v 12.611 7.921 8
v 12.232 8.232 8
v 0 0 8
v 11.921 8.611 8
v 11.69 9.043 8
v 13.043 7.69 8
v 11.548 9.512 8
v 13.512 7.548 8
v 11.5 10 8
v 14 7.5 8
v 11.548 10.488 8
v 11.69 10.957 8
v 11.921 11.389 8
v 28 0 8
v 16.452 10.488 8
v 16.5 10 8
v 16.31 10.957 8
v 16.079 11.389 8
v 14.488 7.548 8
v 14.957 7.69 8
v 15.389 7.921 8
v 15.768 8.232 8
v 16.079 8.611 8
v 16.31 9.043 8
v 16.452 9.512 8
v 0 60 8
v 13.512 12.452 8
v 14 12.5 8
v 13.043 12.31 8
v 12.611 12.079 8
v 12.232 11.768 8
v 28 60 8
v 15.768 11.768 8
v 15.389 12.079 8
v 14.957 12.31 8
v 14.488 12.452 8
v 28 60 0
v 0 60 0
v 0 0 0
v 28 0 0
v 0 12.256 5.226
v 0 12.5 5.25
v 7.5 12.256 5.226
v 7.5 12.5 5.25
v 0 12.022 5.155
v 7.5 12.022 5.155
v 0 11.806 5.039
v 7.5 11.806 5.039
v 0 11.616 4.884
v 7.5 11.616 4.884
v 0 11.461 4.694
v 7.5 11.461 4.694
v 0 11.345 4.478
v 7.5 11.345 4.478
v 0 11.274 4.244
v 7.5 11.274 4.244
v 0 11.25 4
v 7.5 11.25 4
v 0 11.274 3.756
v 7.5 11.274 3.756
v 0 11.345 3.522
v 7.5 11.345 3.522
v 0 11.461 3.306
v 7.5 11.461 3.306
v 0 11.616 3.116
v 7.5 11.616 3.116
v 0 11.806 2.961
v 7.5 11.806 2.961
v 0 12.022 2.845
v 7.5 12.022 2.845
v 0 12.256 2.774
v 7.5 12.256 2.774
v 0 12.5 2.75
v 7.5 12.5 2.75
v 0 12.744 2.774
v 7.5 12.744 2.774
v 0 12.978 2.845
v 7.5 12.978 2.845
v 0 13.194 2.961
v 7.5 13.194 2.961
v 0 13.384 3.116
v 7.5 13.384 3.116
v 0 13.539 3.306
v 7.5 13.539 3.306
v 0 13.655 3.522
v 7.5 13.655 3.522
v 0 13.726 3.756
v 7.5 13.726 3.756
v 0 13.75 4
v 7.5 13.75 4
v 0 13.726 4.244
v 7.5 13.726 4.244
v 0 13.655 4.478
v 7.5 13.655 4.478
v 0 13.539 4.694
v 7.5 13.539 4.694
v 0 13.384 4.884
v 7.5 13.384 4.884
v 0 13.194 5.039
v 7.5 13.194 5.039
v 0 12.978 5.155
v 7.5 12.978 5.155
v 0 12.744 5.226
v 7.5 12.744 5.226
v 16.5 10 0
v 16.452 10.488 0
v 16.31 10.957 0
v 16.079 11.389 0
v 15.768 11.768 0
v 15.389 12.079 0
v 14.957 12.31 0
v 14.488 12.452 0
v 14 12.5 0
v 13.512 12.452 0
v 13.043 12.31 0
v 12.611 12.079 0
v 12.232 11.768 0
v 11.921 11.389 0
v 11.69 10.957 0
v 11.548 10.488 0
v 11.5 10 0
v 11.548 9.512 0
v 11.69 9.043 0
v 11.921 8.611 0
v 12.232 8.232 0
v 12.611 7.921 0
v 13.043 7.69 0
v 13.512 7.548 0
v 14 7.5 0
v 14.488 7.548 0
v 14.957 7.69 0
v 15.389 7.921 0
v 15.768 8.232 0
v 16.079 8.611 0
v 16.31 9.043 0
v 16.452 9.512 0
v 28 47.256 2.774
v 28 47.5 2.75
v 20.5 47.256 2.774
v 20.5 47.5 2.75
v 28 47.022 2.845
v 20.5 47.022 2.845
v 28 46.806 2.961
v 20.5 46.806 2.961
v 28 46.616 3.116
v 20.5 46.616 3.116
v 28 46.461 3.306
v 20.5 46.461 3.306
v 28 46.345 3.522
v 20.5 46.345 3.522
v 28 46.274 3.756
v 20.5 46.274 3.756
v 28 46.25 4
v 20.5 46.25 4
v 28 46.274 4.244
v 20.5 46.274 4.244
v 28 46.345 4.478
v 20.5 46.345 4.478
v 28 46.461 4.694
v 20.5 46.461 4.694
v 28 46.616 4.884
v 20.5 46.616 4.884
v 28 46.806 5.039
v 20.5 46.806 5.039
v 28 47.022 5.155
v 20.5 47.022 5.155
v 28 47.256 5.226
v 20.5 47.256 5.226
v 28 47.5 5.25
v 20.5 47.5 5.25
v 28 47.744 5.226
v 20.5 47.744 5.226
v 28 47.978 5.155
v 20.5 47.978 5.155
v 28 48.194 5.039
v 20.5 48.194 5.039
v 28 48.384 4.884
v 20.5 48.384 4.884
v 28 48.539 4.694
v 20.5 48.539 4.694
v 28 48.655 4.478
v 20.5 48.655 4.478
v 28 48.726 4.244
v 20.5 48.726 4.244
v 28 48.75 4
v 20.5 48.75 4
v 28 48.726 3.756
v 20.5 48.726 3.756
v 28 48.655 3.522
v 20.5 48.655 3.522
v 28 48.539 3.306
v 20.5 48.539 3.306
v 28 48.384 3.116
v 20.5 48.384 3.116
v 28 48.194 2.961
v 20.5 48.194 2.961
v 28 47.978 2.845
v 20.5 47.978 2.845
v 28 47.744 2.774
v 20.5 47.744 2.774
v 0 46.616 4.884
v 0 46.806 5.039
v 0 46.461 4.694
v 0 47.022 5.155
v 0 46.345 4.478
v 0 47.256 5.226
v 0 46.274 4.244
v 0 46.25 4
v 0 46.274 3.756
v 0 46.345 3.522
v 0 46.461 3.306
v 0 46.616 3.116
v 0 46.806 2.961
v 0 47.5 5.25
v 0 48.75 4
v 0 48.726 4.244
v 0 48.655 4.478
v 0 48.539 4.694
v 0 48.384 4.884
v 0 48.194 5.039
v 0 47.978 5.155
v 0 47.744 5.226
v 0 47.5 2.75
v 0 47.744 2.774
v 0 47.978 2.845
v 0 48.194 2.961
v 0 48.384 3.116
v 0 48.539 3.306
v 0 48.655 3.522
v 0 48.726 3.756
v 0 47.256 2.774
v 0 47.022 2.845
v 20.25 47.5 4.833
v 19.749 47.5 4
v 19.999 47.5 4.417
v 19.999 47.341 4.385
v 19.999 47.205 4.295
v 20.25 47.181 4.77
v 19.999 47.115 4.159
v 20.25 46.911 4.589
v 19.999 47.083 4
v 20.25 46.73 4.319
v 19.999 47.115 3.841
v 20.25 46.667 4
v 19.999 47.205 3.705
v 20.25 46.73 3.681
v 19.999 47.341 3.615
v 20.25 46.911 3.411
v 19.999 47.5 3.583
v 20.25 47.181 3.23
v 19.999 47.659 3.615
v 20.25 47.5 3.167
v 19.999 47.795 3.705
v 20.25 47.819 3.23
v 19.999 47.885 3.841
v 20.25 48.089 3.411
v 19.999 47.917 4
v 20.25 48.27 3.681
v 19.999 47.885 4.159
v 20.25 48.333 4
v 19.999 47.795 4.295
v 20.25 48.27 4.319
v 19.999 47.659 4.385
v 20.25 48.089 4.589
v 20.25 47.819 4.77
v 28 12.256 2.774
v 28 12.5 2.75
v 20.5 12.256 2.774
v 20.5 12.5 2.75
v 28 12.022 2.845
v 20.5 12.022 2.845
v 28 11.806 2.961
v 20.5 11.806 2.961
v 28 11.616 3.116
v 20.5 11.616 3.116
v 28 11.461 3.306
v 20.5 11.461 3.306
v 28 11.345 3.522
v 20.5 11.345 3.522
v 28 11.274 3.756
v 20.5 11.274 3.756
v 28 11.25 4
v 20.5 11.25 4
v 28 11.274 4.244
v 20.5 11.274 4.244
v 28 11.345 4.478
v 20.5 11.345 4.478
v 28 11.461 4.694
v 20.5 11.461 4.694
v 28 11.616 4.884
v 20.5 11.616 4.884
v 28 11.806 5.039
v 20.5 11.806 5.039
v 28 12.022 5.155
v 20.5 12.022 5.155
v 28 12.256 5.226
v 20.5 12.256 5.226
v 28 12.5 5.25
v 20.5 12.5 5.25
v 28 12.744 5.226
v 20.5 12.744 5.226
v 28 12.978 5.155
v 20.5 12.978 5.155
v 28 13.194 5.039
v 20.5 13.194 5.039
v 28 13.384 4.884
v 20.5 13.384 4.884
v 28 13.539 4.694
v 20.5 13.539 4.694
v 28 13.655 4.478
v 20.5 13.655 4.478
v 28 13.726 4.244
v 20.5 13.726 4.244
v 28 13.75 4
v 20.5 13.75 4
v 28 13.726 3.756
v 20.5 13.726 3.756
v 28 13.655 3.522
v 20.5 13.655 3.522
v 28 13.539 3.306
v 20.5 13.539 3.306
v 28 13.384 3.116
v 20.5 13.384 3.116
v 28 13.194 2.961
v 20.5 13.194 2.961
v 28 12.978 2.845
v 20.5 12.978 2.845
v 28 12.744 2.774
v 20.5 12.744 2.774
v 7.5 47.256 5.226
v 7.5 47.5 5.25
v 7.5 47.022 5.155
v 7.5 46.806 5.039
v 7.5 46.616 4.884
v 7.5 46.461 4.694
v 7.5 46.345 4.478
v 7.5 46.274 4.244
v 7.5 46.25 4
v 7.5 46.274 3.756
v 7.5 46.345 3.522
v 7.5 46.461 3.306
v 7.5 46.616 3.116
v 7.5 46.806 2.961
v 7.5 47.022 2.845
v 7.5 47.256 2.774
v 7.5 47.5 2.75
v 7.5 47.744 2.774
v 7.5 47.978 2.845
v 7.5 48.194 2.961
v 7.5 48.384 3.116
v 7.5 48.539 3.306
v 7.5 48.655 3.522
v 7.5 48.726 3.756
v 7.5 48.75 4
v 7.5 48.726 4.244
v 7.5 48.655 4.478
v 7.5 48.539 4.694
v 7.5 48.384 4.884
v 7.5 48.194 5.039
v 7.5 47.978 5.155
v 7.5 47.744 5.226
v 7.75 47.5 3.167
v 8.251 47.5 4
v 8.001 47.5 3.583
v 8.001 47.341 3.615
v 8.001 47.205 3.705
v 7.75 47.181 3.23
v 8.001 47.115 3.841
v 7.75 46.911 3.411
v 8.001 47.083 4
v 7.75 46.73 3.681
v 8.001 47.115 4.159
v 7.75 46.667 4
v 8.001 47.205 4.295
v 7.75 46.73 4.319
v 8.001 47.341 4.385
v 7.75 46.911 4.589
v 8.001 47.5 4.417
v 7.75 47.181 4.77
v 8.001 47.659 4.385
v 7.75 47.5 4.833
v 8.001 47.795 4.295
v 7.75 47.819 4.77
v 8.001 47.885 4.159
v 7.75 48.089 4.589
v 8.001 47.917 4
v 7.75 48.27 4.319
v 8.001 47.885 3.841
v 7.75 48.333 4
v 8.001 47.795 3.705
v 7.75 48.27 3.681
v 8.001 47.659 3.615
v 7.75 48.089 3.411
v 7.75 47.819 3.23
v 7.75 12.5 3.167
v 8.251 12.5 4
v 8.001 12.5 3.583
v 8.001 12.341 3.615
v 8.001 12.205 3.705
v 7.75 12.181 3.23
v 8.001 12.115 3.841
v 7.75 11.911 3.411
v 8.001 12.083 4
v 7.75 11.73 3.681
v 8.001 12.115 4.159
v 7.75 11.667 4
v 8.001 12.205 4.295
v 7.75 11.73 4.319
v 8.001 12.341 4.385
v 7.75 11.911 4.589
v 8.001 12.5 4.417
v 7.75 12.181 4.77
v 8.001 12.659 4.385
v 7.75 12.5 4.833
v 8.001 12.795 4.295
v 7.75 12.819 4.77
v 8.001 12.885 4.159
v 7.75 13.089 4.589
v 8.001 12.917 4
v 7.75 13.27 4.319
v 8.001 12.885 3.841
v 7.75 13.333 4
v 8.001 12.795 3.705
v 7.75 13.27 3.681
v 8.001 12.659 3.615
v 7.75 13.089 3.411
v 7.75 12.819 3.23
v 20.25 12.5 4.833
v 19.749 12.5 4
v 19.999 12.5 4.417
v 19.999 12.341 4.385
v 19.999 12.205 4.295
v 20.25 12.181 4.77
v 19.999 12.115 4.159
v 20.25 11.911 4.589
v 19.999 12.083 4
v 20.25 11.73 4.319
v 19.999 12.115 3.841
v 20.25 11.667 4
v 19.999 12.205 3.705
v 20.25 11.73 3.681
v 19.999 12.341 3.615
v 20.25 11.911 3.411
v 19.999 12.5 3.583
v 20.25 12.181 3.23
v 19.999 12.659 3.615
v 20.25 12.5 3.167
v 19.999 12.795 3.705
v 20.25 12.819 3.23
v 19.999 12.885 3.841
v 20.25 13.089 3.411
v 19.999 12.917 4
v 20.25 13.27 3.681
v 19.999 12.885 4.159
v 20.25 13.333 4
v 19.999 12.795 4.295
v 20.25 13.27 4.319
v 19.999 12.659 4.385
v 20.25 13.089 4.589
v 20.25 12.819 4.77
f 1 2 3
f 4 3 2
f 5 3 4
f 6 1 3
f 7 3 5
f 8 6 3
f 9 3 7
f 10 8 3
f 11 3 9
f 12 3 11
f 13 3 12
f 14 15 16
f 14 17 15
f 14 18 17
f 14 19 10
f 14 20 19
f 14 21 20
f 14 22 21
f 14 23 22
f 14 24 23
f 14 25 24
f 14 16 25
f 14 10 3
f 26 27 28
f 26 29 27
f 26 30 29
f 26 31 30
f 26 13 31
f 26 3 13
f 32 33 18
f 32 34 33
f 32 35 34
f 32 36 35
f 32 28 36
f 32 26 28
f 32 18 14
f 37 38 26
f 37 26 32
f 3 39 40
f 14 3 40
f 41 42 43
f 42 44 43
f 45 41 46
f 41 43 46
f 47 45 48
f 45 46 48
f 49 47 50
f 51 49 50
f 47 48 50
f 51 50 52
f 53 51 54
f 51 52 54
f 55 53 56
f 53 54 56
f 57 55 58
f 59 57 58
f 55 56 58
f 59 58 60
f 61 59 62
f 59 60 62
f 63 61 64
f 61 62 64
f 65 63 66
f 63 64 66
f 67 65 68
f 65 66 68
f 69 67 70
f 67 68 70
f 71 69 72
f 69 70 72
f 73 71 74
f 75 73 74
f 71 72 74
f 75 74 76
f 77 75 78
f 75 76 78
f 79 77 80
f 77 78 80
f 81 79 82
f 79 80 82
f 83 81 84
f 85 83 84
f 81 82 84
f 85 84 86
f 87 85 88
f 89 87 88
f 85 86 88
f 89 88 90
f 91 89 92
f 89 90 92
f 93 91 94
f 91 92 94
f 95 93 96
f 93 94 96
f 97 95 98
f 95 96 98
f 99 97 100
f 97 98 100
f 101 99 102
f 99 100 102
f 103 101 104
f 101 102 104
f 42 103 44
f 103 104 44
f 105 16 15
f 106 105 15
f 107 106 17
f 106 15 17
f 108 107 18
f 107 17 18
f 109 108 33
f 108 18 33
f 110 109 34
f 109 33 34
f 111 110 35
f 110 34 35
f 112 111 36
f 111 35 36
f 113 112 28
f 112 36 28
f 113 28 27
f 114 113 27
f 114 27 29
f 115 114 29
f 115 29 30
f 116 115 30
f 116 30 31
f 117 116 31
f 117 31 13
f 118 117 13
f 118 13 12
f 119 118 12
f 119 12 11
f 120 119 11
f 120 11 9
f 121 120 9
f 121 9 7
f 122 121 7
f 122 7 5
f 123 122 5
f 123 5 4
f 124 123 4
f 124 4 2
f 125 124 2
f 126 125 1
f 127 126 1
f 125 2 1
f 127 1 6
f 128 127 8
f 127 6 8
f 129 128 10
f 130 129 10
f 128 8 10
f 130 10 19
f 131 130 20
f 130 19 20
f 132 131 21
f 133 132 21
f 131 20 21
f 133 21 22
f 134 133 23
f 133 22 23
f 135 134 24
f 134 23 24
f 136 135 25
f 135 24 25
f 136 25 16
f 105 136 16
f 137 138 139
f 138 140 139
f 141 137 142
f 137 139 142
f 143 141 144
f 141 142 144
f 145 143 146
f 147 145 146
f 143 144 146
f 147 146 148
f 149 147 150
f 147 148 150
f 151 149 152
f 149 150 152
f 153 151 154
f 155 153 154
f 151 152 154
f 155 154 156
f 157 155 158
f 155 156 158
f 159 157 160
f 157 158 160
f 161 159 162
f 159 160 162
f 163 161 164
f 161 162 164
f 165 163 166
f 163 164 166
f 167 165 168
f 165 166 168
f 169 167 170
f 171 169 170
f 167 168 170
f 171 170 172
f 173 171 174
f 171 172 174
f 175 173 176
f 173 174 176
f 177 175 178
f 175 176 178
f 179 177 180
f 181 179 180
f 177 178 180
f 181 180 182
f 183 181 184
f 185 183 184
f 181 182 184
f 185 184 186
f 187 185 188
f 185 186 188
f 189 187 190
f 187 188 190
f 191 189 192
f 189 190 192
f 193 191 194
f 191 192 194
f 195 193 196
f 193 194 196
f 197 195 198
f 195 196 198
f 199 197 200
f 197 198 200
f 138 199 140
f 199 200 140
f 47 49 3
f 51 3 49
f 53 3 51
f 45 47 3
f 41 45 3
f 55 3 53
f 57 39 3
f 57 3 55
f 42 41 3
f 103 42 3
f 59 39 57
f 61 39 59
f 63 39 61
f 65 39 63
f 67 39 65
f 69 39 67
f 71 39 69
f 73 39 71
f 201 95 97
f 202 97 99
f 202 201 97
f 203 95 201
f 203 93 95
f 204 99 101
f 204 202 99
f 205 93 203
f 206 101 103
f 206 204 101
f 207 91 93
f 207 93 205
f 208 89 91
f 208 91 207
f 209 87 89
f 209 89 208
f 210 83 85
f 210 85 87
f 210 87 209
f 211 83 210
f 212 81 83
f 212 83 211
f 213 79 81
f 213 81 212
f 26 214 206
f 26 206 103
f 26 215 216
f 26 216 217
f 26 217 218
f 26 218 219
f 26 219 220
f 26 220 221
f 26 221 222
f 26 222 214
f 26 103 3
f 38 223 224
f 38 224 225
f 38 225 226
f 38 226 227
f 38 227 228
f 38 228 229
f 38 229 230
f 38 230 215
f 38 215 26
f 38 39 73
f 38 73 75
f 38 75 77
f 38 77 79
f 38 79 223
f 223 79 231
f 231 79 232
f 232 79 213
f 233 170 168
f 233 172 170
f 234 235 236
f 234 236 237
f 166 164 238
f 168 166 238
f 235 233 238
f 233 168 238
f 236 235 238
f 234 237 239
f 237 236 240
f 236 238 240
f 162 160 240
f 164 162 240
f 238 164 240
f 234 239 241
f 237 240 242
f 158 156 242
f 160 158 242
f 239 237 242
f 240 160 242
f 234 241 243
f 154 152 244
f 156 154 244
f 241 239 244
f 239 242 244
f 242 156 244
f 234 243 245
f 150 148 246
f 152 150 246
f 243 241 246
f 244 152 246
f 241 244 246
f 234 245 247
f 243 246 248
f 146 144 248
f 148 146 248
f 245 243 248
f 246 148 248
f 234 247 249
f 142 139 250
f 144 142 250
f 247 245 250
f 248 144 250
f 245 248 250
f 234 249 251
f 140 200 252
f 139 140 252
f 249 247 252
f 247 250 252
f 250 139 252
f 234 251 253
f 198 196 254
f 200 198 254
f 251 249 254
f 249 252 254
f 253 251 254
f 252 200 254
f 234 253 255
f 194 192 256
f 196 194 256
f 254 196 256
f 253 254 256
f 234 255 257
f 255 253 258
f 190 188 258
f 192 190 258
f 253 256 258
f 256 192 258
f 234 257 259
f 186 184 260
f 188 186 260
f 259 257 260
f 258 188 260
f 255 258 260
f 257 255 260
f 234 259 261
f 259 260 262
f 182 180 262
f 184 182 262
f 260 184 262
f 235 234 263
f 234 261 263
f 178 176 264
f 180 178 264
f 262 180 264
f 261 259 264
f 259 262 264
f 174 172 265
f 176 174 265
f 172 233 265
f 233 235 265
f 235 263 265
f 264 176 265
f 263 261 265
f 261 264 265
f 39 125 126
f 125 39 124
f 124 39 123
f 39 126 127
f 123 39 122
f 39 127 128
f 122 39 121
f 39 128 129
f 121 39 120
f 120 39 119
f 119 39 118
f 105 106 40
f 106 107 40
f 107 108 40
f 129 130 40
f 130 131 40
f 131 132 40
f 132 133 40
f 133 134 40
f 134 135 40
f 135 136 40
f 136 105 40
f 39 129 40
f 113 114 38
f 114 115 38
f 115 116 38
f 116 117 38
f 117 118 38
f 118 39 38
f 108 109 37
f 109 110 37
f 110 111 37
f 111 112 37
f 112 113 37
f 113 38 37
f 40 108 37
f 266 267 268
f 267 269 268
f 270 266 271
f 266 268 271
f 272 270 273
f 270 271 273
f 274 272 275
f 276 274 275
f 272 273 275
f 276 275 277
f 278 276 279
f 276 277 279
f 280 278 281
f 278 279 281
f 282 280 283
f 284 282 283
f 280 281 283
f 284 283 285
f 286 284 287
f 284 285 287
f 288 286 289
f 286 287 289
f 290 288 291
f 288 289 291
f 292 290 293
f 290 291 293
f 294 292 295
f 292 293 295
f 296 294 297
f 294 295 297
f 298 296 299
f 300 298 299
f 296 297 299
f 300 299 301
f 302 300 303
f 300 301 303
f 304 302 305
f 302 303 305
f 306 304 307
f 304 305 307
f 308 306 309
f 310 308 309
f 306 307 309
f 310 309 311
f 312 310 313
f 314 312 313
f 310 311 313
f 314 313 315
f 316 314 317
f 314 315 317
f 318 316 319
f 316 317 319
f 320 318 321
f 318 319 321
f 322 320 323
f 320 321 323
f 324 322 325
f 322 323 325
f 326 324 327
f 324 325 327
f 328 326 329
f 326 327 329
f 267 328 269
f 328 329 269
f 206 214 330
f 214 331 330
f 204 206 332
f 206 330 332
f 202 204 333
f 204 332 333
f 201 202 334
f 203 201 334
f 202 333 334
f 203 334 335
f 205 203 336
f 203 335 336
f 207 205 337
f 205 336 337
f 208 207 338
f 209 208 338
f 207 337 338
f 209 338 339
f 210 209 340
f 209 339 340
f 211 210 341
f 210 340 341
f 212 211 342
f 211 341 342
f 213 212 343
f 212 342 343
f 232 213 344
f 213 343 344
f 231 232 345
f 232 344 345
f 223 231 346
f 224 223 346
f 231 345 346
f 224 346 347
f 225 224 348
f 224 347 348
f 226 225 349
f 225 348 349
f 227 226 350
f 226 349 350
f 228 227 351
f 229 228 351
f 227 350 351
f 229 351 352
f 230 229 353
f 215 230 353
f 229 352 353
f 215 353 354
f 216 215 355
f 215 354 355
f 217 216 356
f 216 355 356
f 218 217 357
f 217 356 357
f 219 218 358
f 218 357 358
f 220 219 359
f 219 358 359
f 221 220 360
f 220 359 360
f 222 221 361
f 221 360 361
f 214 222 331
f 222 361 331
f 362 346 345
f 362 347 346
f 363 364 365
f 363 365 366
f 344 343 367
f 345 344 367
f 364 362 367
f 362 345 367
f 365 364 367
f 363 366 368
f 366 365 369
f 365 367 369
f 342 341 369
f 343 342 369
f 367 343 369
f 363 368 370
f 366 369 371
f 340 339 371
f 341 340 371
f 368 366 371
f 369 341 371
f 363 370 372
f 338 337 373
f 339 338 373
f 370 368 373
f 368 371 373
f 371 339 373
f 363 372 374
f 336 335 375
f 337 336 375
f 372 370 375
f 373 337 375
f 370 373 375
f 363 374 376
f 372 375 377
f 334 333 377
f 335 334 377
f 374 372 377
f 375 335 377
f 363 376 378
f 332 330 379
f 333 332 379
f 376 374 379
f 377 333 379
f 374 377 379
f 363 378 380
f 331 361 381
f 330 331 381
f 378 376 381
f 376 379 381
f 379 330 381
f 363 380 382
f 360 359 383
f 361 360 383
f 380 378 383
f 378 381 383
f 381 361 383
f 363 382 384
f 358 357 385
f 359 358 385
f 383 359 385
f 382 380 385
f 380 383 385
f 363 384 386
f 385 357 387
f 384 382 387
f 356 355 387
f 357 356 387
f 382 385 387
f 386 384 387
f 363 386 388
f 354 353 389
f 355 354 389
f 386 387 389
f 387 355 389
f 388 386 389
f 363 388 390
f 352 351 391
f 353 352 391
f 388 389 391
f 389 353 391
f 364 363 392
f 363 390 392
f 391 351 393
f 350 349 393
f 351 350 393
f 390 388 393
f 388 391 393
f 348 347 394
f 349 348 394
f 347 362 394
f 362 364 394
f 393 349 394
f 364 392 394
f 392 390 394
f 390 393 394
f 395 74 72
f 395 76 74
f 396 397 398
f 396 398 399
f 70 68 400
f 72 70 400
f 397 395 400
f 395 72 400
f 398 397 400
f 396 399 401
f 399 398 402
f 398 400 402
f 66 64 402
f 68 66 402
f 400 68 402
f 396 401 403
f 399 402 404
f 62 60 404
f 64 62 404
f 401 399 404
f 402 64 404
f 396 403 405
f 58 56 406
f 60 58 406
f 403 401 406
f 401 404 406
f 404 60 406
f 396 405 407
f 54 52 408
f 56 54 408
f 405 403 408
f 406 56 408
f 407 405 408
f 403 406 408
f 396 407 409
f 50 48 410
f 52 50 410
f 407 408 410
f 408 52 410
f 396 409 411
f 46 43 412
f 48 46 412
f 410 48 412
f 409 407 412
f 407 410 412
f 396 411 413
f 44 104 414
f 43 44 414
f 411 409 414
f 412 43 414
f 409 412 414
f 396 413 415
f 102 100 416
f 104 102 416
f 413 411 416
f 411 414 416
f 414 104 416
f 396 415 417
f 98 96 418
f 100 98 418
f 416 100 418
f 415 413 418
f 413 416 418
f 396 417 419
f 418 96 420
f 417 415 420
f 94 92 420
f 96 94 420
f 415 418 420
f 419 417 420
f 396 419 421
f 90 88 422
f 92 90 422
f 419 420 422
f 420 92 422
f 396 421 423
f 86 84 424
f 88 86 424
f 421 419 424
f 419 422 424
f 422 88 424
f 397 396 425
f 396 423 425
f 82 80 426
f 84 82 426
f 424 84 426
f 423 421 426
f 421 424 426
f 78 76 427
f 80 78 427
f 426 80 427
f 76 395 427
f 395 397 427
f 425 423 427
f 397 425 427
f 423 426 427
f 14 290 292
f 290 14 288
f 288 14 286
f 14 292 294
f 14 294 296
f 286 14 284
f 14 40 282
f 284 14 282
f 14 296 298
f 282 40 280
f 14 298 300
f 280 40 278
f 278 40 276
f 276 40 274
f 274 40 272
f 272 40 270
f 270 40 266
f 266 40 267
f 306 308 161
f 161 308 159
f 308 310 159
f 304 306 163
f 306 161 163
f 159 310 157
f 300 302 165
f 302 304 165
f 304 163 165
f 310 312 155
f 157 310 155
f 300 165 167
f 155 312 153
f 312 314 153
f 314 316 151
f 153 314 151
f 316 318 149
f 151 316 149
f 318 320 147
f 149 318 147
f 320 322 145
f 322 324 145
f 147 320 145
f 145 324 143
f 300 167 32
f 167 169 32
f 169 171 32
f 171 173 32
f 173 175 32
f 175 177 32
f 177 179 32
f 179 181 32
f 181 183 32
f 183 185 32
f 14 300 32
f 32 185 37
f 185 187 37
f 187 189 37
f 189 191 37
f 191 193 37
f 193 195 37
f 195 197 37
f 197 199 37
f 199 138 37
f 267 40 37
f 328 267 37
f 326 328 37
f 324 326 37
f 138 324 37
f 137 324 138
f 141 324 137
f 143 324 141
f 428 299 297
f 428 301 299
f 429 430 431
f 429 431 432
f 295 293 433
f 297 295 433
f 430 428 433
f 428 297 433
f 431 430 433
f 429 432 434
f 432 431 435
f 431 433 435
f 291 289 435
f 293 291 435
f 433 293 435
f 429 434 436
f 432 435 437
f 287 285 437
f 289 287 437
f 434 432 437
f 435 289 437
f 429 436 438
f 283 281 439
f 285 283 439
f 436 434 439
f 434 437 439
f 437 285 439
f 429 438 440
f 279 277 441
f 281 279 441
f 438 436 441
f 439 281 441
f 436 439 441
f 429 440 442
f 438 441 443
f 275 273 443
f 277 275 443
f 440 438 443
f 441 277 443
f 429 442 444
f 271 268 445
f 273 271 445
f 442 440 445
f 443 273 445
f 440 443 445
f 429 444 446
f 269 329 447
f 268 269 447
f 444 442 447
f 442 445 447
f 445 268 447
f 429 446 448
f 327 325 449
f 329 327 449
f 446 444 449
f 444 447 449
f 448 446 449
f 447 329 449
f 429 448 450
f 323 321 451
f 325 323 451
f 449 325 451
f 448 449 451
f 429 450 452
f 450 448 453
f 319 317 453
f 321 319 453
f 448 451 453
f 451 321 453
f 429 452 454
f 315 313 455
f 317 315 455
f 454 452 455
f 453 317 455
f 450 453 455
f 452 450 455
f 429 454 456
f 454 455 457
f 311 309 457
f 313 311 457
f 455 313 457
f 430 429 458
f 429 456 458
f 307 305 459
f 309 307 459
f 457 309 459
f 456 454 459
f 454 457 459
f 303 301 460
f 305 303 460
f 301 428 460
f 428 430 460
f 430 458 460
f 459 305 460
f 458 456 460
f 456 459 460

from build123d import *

# Parameters (mm, degrees)
SKETCH_1_W          = 28
SKETCH_1_H          = 60
EXTRUDE_1_DEPTH     = 8
SKETCH_2_R          = 2.5
CUT_EXTRUDE_1_DEPTH = 67.693328002
M3X0_5_1_D          = 2.5
M3X0_5_1_DEPTH      = 7.5
M3X0_5_1_TIP        = 0.751075774
M3X0_5_2_D          = 2.5
M3X0_5_2_DEPTH      = 7.5
M3X0_5_2_TIP        = 0.751075774


with BuildPart() as part:
    # ｽｹｯﾁ1 → ﾎﾞｽ - 押し出し1 (new body)
    with BuildSketch(Plane.XY):
        with Locations((14, 30)):
            Rectangle(SKETCH_1_W, SKETCH_1_H)
    extrude(amount=EXTRUDE_1_DEPTH)

    # ｽｹｯﾁ2 → ｶｯﾄ - 押し出し1 (cut, through all)
    with BuildSketch(Plane.XY.offset(8)):
        with Locations((14, 10)):
            Circle(SKETCH_2_R)
    extrude(amount=-CUT_EXTRUDE_1_DEPTH, mode=Mode.SUBTRACT)

    # M3x0.5 ねじ穴1
    with Locations(Plane(origin=(0, 47.5, 4), x_dir=(0, 0, -1), z_dir=(-1, 0, 0))):
        with Locations((0, 0), (0, 35)):
            Hole(M3X0_5_1_D / 2, depth=M3X0_5_1_DEPTH)
            with Locations((0, 0, -(M3X0_5_1_DEPTH + M3X0_5_1_TIP / 2))):  # 118° drill point
                Cone(0, M3X0_5_1_D / 2, M3X0_5_1_TIP, mode=Mode.SUBTRACT)

    # M3x0.5 ねじ穴2
    with Locations(Plane(origin=(28, 47.5, 4), x_dir=(0, 0, 1), z_dir=(1, 0, 0))):
        with Locations((0, 0), (0, 35)):
            Hole(M3X0_5_2_D / 2, depth=M3X0_5_2_DEPTH)
            with Locations((0, 0, -(M3X0_5_2_DEPTH + M3X0_5_2_TIP / 2))):  # 118° drill point
                Cone(0, M3X0_5_2_D / 2, M3X0_5_2_TIP, mode=Mode.SUBTRACT)


solid = part.part
